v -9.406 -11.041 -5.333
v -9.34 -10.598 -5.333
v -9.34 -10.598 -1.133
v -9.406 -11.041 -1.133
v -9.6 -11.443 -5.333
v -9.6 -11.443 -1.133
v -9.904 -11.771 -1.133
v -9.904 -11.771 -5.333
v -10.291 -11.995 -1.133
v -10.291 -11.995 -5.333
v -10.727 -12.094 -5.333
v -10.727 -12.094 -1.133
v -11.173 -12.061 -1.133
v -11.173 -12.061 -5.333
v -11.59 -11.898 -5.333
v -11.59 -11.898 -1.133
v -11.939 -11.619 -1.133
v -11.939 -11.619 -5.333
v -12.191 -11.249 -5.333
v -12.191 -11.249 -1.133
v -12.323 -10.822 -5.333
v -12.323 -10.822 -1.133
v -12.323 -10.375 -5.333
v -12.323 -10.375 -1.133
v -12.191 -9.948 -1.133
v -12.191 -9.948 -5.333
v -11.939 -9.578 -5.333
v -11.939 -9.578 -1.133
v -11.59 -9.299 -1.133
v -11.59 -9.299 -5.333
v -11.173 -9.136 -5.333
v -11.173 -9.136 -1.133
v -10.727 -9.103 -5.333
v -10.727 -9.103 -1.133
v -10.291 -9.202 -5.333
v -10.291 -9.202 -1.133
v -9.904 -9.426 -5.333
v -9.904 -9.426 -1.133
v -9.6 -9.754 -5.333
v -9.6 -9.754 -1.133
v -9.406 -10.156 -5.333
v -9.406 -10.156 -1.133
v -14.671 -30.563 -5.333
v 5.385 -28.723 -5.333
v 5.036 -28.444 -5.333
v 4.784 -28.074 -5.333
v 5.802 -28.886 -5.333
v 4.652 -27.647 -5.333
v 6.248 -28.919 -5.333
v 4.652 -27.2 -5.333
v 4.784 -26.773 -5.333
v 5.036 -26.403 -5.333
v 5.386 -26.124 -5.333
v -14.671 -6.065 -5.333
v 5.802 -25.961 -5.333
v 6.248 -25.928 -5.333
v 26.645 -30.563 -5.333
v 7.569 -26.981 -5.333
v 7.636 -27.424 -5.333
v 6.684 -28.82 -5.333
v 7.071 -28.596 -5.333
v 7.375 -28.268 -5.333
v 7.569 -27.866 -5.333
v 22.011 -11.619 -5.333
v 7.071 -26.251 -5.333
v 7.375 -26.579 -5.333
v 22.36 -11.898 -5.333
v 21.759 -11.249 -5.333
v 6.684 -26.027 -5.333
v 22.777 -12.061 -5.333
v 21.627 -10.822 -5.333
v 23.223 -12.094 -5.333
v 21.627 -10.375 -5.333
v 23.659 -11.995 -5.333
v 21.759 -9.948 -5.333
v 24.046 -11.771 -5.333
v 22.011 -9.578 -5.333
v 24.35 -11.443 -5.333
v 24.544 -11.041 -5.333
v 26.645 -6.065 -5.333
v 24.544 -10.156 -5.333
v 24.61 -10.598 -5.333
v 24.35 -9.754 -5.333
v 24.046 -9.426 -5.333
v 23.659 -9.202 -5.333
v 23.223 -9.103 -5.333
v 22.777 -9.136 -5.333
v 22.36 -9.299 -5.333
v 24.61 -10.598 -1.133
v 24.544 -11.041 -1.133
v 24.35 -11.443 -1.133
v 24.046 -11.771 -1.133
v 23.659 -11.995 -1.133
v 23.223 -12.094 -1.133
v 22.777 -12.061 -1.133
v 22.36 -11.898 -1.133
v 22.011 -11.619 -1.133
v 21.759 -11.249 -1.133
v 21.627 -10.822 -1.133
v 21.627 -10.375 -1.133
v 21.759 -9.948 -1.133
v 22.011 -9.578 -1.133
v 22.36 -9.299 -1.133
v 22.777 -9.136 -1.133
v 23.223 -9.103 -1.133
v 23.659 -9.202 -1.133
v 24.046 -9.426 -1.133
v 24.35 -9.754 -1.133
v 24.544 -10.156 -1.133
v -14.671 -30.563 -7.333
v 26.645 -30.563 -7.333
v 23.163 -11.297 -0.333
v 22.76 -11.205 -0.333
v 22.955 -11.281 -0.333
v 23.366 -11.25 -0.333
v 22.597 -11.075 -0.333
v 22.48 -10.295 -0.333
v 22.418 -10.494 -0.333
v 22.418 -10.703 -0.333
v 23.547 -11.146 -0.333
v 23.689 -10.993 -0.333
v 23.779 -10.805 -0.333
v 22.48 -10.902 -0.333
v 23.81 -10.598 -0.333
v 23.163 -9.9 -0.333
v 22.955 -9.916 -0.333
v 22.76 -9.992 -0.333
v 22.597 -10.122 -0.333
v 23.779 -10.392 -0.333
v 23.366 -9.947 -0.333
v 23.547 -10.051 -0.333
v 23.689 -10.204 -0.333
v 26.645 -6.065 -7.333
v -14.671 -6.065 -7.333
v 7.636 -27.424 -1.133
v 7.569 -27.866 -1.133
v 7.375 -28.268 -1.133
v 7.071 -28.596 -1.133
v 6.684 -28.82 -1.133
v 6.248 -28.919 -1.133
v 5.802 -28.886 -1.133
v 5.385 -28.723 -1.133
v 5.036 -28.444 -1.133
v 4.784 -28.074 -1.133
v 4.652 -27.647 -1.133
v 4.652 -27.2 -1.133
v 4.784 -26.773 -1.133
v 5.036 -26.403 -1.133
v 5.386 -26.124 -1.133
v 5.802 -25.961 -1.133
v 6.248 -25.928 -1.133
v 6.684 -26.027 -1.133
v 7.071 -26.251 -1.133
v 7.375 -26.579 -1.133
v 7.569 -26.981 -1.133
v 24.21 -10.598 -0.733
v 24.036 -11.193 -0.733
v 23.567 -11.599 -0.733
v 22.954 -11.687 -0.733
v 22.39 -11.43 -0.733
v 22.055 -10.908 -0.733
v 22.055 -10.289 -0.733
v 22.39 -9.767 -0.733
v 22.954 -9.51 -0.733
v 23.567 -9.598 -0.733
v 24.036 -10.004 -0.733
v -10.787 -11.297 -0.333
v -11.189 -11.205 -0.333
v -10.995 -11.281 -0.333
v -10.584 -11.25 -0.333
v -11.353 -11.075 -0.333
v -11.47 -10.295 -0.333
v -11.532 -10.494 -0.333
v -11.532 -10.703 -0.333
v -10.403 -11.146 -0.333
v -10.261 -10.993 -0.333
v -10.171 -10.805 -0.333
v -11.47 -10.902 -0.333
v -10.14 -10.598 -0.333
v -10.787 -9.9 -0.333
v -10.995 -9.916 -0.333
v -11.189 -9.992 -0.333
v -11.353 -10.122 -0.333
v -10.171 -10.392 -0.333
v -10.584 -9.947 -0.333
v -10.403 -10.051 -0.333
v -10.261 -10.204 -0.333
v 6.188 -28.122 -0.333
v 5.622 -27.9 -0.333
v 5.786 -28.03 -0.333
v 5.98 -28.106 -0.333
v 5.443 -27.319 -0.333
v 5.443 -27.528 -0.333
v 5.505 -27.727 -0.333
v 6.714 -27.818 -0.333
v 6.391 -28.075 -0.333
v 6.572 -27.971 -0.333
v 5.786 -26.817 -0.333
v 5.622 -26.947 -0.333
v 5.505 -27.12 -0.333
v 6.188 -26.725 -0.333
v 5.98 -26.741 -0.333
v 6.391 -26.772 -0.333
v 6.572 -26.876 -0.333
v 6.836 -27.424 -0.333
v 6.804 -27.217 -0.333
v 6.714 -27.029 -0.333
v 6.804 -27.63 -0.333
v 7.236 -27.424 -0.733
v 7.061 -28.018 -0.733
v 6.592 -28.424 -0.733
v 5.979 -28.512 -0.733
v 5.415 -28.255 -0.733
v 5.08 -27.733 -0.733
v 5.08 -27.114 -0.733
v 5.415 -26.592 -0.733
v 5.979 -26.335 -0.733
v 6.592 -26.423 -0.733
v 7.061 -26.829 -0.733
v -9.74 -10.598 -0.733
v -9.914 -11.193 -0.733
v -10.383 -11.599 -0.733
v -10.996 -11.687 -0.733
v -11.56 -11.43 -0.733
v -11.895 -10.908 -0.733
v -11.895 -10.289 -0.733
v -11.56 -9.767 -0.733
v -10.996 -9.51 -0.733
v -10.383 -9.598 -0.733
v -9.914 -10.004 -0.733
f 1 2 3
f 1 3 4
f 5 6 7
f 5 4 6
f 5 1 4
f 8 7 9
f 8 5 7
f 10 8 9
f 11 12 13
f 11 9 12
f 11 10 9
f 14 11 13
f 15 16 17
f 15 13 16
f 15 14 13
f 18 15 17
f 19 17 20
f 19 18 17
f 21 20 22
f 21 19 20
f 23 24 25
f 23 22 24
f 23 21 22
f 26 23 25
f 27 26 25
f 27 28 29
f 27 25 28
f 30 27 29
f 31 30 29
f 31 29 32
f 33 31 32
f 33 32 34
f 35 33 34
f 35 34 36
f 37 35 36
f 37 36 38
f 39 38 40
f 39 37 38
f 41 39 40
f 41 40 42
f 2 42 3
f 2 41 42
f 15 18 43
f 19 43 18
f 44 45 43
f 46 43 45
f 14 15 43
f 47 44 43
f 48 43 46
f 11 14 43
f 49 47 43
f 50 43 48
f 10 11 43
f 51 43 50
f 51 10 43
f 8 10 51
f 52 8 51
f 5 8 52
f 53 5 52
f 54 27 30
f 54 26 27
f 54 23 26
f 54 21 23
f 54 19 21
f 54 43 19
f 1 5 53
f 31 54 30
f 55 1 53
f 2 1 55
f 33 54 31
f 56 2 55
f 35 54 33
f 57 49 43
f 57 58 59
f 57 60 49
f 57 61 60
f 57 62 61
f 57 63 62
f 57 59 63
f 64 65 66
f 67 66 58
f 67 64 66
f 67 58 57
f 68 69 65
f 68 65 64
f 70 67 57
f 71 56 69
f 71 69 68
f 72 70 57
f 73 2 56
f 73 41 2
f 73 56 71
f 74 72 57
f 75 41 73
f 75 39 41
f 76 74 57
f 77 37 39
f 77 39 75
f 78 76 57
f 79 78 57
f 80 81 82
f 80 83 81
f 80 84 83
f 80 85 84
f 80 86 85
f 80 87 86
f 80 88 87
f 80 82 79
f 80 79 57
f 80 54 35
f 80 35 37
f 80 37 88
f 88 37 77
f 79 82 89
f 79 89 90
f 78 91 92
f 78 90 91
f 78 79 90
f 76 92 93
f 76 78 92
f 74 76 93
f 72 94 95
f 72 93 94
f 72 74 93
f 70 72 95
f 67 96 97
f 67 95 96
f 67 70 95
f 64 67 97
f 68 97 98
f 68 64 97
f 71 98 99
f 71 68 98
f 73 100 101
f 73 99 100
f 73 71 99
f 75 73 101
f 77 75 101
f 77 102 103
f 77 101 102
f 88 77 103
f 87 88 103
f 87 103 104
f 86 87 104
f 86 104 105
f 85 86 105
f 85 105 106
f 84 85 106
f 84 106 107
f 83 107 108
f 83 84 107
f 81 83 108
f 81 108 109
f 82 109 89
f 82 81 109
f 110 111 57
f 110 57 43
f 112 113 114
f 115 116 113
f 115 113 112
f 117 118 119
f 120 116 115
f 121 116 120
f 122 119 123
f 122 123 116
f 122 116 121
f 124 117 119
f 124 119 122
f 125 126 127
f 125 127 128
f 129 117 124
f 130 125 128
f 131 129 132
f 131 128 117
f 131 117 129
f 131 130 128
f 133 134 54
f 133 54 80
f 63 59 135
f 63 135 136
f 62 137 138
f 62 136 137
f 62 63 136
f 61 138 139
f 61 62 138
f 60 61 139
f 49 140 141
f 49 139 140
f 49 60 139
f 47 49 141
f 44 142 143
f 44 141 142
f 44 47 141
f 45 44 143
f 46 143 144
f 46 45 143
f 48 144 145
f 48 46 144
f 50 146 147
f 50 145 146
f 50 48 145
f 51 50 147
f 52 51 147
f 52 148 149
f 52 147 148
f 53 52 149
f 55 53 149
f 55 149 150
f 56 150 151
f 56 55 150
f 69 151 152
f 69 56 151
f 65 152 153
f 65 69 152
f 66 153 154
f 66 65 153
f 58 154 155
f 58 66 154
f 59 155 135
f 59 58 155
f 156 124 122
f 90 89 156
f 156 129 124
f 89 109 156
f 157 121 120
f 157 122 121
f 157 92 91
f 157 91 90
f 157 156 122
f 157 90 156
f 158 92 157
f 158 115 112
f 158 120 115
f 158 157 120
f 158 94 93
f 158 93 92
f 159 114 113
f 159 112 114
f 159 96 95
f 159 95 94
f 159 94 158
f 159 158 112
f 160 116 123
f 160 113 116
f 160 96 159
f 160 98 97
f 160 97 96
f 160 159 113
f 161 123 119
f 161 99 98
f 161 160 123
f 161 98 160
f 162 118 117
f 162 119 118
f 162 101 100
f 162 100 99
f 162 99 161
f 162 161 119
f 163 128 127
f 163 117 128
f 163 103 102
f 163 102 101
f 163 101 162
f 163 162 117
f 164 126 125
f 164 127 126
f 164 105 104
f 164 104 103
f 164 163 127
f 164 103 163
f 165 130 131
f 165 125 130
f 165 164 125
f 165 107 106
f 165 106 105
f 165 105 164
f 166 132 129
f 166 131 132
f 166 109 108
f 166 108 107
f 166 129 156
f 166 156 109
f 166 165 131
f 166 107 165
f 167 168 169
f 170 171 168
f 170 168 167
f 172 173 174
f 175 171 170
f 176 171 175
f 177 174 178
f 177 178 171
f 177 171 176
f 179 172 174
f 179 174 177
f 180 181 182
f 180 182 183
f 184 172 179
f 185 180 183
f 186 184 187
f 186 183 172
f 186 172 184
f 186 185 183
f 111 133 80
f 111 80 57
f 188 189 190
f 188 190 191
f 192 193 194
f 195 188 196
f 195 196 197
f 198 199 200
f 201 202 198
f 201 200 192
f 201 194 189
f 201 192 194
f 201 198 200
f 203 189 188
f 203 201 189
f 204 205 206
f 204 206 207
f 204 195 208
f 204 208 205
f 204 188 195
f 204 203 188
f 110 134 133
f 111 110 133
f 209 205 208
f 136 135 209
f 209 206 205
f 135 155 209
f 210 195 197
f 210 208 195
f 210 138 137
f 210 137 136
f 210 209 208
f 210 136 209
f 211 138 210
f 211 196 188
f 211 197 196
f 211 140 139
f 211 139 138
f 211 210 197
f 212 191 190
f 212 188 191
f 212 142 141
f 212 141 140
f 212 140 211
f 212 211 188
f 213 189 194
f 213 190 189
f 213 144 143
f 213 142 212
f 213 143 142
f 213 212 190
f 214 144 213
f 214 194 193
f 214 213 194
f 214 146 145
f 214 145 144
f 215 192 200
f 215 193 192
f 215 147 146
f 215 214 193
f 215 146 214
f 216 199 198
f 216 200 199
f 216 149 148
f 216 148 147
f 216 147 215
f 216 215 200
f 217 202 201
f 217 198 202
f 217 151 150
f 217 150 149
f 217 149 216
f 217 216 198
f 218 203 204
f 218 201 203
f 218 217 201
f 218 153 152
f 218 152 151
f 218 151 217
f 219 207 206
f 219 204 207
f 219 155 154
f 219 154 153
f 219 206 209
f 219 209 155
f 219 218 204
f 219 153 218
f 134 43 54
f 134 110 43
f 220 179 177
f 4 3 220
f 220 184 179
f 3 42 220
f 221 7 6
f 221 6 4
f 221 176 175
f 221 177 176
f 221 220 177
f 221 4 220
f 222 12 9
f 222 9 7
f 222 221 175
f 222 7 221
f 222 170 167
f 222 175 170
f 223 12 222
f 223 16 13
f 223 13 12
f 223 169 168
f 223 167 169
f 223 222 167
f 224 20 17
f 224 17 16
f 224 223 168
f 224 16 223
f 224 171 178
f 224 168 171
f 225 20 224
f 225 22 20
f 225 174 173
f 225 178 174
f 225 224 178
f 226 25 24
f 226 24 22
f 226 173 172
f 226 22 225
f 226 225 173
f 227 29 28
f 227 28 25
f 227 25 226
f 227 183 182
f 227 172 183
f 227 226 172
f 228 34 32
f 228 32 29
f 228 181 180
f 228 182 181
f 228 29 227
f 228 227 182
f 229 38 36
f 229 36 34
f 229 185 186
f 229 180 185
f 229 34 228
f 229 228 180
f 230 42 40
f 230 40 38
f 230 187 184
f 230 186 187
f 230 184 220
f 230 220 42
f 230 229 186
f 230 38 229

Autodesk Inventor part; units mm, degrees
ref_plane "YZ Plane" through (0, 0, 0) normal (1, 0, 0) x (0, 1, 0)
ref_plane "XZ Plane" through (0, 0, 0) normal (0, 1, 0) x (-1, 0, 0)
ref_plane "XY Plane" through (0, 0, 0) normal (0, 0, 1) x (1, 0, 0)
ref_plane "Work Plane3" through (6.1355, -21.1735, -7.3328) normal (0, 0, 1) x (1, 0, 0)
sketch "Sketch3" plane through (6.1355, -21.1735, -7.3328) normal (0, 0, 1) x (1, 0, 0)
  line L0 (20.5093, -9.3897) -> (-20.8066, -9.3897)
  line L1 (-20.8066, -9.3897) -> (-20.8066, 15.1082)
  line L2 (-20.8066, 15.1082) -> (20.5093, 15.1082)
  line L3 (20.5093, 15.1082) -> (20.5093, -9.3897)
  line L4 (-12.3, 2) -> (7, 2) projected
  circle A0 centre (16.975, 10.575) radius 1.621 projected
  circle A1 centre (0, -6.25) radius 1.621 projected
  circle A2 centre (-16.975, 10.575) radius 1.621 projected
  line L5 (-19.5, 23) -> (-19.5, -23) projected
  line L6 (-19.5, -23) -> (-13.8, -23) projected
  line L7 (-13.8, -23) -> (-13.8, -17.4) projected
  arc A3 (-10.8, -14.4) -> (-13.8, -17.4) centre (-10.8, -17.4) ccw projected
  line L8 (-10.8, -14.4) -> (10.8, -14.4) projected
  arc A4 (13.8, -17.4) -> (10.8, -14.4) centre (10.8, -17.4) ccw projected
  line L9 (13.8, -17.4) -> (13.8, -23) projected
  line L10 (13.8, -23) -> (19.5, -23) projected
  line L11 (19.5, -23) -> (19.5, 23) projected
  line L12 (19.5, 23) -> (-19.5, 23) projected
  circle A5 centre (-17, -20) radius 1.25 projected
  circle A6 centre (17, -20) radius 1.25 projected
  circle A7 centre (17, 20) radius 1.25 projected
  circle A8 centre (-17, 20) radius 1.25 projected
  circle A9 centre (0, -6.25) radius 1.5
  circle A10 centre (16.975, 10.575) radius 1.5
  circle A11 centre (-16.975, 10.575) radius 1.5
  point P0 (-6.1355, 21.1735)
  dimension "d18" = 3
  dimension "d19" = 3
  dimension "d20" = 3
extrude "Extrusion3" add sketch "Sketch3" along normal blind 2 contours L0 L11 L2 L3 | L0 L5 L2 L11 | L0 L1 L2 L5 | A0 | A1 | A2 | A9 | A10 | A11
sketch "Sketch4" plane through (6.1355, -21.1735, -5.3328) normal (0, 0, 1) x (1, 0, 0)
  circle A0 centre (16.975, 10.575) radius 1.621 projected
  circle A1 centre (0, -6.25) radius 1.621 projected
  circle A2 centre (-16.975, 10.575) radius 1.621 projected
  line L0 (-19.5, 23) -> (-19.5, -23) projected
  line L1 (-19.5, -23) -> (-13.8, -23) projected
  line L2 (-13.8, -23) -> (-13.8, -17.4) projected
  arc A3 (-10.8, -14.4) -> (-13.8, -17.4) centre (-10.8, -17.4) ccw projected
  line L3 (-10.8, -14.4) -> (10.8, -14.4) projected
  arc A4 (13.8, -17.4) -> (10.8, -14.4) centre (10.8, -17.4) ccw projected
  line L4 (13.8, -17.4) -> (13.8, -23) projected
  line L5 (13.8, -23) -> (19.5, -23) projected
  line L6 (19.5, -23) -> (19.5, 23) projected
  line L7 (19.5, 23) -> (-19.5, 23) projected
  circle A5 centre (-17, -20) radius 1.25 projected
  circle A6 centre (17, -20) radius 1.25 projected
  circle A7 centre (17, 20) radius 1.25 projected
  circle A8 centre (-17, 20) radius 1.25 projected
  circle A9 centre (0, -6.25) radius 1.5
  circle A10 centre (-16.975, 10.575) radius 1.5
  circle A11 centre (16.975, 10.575) radius 1.5
  point P0 (-6.1355, 21.1735)
  dimension "d23" = 3
  dimension "d24" = 3
  dimension "d25" = 3
extrude "Extrusion4" add sketch "Sketch4" along normal blind 5 contours A9 | A10 | A11
chamfer "Chamfer2" distance 0.8 angle 45 3 edges at (21.6105, -10.5985, -0.3328) (4.6355, -27.4235, -0.3328) (-12.3395, -10.5985, -0.3328)
properties part number "vesc_holes_check"
